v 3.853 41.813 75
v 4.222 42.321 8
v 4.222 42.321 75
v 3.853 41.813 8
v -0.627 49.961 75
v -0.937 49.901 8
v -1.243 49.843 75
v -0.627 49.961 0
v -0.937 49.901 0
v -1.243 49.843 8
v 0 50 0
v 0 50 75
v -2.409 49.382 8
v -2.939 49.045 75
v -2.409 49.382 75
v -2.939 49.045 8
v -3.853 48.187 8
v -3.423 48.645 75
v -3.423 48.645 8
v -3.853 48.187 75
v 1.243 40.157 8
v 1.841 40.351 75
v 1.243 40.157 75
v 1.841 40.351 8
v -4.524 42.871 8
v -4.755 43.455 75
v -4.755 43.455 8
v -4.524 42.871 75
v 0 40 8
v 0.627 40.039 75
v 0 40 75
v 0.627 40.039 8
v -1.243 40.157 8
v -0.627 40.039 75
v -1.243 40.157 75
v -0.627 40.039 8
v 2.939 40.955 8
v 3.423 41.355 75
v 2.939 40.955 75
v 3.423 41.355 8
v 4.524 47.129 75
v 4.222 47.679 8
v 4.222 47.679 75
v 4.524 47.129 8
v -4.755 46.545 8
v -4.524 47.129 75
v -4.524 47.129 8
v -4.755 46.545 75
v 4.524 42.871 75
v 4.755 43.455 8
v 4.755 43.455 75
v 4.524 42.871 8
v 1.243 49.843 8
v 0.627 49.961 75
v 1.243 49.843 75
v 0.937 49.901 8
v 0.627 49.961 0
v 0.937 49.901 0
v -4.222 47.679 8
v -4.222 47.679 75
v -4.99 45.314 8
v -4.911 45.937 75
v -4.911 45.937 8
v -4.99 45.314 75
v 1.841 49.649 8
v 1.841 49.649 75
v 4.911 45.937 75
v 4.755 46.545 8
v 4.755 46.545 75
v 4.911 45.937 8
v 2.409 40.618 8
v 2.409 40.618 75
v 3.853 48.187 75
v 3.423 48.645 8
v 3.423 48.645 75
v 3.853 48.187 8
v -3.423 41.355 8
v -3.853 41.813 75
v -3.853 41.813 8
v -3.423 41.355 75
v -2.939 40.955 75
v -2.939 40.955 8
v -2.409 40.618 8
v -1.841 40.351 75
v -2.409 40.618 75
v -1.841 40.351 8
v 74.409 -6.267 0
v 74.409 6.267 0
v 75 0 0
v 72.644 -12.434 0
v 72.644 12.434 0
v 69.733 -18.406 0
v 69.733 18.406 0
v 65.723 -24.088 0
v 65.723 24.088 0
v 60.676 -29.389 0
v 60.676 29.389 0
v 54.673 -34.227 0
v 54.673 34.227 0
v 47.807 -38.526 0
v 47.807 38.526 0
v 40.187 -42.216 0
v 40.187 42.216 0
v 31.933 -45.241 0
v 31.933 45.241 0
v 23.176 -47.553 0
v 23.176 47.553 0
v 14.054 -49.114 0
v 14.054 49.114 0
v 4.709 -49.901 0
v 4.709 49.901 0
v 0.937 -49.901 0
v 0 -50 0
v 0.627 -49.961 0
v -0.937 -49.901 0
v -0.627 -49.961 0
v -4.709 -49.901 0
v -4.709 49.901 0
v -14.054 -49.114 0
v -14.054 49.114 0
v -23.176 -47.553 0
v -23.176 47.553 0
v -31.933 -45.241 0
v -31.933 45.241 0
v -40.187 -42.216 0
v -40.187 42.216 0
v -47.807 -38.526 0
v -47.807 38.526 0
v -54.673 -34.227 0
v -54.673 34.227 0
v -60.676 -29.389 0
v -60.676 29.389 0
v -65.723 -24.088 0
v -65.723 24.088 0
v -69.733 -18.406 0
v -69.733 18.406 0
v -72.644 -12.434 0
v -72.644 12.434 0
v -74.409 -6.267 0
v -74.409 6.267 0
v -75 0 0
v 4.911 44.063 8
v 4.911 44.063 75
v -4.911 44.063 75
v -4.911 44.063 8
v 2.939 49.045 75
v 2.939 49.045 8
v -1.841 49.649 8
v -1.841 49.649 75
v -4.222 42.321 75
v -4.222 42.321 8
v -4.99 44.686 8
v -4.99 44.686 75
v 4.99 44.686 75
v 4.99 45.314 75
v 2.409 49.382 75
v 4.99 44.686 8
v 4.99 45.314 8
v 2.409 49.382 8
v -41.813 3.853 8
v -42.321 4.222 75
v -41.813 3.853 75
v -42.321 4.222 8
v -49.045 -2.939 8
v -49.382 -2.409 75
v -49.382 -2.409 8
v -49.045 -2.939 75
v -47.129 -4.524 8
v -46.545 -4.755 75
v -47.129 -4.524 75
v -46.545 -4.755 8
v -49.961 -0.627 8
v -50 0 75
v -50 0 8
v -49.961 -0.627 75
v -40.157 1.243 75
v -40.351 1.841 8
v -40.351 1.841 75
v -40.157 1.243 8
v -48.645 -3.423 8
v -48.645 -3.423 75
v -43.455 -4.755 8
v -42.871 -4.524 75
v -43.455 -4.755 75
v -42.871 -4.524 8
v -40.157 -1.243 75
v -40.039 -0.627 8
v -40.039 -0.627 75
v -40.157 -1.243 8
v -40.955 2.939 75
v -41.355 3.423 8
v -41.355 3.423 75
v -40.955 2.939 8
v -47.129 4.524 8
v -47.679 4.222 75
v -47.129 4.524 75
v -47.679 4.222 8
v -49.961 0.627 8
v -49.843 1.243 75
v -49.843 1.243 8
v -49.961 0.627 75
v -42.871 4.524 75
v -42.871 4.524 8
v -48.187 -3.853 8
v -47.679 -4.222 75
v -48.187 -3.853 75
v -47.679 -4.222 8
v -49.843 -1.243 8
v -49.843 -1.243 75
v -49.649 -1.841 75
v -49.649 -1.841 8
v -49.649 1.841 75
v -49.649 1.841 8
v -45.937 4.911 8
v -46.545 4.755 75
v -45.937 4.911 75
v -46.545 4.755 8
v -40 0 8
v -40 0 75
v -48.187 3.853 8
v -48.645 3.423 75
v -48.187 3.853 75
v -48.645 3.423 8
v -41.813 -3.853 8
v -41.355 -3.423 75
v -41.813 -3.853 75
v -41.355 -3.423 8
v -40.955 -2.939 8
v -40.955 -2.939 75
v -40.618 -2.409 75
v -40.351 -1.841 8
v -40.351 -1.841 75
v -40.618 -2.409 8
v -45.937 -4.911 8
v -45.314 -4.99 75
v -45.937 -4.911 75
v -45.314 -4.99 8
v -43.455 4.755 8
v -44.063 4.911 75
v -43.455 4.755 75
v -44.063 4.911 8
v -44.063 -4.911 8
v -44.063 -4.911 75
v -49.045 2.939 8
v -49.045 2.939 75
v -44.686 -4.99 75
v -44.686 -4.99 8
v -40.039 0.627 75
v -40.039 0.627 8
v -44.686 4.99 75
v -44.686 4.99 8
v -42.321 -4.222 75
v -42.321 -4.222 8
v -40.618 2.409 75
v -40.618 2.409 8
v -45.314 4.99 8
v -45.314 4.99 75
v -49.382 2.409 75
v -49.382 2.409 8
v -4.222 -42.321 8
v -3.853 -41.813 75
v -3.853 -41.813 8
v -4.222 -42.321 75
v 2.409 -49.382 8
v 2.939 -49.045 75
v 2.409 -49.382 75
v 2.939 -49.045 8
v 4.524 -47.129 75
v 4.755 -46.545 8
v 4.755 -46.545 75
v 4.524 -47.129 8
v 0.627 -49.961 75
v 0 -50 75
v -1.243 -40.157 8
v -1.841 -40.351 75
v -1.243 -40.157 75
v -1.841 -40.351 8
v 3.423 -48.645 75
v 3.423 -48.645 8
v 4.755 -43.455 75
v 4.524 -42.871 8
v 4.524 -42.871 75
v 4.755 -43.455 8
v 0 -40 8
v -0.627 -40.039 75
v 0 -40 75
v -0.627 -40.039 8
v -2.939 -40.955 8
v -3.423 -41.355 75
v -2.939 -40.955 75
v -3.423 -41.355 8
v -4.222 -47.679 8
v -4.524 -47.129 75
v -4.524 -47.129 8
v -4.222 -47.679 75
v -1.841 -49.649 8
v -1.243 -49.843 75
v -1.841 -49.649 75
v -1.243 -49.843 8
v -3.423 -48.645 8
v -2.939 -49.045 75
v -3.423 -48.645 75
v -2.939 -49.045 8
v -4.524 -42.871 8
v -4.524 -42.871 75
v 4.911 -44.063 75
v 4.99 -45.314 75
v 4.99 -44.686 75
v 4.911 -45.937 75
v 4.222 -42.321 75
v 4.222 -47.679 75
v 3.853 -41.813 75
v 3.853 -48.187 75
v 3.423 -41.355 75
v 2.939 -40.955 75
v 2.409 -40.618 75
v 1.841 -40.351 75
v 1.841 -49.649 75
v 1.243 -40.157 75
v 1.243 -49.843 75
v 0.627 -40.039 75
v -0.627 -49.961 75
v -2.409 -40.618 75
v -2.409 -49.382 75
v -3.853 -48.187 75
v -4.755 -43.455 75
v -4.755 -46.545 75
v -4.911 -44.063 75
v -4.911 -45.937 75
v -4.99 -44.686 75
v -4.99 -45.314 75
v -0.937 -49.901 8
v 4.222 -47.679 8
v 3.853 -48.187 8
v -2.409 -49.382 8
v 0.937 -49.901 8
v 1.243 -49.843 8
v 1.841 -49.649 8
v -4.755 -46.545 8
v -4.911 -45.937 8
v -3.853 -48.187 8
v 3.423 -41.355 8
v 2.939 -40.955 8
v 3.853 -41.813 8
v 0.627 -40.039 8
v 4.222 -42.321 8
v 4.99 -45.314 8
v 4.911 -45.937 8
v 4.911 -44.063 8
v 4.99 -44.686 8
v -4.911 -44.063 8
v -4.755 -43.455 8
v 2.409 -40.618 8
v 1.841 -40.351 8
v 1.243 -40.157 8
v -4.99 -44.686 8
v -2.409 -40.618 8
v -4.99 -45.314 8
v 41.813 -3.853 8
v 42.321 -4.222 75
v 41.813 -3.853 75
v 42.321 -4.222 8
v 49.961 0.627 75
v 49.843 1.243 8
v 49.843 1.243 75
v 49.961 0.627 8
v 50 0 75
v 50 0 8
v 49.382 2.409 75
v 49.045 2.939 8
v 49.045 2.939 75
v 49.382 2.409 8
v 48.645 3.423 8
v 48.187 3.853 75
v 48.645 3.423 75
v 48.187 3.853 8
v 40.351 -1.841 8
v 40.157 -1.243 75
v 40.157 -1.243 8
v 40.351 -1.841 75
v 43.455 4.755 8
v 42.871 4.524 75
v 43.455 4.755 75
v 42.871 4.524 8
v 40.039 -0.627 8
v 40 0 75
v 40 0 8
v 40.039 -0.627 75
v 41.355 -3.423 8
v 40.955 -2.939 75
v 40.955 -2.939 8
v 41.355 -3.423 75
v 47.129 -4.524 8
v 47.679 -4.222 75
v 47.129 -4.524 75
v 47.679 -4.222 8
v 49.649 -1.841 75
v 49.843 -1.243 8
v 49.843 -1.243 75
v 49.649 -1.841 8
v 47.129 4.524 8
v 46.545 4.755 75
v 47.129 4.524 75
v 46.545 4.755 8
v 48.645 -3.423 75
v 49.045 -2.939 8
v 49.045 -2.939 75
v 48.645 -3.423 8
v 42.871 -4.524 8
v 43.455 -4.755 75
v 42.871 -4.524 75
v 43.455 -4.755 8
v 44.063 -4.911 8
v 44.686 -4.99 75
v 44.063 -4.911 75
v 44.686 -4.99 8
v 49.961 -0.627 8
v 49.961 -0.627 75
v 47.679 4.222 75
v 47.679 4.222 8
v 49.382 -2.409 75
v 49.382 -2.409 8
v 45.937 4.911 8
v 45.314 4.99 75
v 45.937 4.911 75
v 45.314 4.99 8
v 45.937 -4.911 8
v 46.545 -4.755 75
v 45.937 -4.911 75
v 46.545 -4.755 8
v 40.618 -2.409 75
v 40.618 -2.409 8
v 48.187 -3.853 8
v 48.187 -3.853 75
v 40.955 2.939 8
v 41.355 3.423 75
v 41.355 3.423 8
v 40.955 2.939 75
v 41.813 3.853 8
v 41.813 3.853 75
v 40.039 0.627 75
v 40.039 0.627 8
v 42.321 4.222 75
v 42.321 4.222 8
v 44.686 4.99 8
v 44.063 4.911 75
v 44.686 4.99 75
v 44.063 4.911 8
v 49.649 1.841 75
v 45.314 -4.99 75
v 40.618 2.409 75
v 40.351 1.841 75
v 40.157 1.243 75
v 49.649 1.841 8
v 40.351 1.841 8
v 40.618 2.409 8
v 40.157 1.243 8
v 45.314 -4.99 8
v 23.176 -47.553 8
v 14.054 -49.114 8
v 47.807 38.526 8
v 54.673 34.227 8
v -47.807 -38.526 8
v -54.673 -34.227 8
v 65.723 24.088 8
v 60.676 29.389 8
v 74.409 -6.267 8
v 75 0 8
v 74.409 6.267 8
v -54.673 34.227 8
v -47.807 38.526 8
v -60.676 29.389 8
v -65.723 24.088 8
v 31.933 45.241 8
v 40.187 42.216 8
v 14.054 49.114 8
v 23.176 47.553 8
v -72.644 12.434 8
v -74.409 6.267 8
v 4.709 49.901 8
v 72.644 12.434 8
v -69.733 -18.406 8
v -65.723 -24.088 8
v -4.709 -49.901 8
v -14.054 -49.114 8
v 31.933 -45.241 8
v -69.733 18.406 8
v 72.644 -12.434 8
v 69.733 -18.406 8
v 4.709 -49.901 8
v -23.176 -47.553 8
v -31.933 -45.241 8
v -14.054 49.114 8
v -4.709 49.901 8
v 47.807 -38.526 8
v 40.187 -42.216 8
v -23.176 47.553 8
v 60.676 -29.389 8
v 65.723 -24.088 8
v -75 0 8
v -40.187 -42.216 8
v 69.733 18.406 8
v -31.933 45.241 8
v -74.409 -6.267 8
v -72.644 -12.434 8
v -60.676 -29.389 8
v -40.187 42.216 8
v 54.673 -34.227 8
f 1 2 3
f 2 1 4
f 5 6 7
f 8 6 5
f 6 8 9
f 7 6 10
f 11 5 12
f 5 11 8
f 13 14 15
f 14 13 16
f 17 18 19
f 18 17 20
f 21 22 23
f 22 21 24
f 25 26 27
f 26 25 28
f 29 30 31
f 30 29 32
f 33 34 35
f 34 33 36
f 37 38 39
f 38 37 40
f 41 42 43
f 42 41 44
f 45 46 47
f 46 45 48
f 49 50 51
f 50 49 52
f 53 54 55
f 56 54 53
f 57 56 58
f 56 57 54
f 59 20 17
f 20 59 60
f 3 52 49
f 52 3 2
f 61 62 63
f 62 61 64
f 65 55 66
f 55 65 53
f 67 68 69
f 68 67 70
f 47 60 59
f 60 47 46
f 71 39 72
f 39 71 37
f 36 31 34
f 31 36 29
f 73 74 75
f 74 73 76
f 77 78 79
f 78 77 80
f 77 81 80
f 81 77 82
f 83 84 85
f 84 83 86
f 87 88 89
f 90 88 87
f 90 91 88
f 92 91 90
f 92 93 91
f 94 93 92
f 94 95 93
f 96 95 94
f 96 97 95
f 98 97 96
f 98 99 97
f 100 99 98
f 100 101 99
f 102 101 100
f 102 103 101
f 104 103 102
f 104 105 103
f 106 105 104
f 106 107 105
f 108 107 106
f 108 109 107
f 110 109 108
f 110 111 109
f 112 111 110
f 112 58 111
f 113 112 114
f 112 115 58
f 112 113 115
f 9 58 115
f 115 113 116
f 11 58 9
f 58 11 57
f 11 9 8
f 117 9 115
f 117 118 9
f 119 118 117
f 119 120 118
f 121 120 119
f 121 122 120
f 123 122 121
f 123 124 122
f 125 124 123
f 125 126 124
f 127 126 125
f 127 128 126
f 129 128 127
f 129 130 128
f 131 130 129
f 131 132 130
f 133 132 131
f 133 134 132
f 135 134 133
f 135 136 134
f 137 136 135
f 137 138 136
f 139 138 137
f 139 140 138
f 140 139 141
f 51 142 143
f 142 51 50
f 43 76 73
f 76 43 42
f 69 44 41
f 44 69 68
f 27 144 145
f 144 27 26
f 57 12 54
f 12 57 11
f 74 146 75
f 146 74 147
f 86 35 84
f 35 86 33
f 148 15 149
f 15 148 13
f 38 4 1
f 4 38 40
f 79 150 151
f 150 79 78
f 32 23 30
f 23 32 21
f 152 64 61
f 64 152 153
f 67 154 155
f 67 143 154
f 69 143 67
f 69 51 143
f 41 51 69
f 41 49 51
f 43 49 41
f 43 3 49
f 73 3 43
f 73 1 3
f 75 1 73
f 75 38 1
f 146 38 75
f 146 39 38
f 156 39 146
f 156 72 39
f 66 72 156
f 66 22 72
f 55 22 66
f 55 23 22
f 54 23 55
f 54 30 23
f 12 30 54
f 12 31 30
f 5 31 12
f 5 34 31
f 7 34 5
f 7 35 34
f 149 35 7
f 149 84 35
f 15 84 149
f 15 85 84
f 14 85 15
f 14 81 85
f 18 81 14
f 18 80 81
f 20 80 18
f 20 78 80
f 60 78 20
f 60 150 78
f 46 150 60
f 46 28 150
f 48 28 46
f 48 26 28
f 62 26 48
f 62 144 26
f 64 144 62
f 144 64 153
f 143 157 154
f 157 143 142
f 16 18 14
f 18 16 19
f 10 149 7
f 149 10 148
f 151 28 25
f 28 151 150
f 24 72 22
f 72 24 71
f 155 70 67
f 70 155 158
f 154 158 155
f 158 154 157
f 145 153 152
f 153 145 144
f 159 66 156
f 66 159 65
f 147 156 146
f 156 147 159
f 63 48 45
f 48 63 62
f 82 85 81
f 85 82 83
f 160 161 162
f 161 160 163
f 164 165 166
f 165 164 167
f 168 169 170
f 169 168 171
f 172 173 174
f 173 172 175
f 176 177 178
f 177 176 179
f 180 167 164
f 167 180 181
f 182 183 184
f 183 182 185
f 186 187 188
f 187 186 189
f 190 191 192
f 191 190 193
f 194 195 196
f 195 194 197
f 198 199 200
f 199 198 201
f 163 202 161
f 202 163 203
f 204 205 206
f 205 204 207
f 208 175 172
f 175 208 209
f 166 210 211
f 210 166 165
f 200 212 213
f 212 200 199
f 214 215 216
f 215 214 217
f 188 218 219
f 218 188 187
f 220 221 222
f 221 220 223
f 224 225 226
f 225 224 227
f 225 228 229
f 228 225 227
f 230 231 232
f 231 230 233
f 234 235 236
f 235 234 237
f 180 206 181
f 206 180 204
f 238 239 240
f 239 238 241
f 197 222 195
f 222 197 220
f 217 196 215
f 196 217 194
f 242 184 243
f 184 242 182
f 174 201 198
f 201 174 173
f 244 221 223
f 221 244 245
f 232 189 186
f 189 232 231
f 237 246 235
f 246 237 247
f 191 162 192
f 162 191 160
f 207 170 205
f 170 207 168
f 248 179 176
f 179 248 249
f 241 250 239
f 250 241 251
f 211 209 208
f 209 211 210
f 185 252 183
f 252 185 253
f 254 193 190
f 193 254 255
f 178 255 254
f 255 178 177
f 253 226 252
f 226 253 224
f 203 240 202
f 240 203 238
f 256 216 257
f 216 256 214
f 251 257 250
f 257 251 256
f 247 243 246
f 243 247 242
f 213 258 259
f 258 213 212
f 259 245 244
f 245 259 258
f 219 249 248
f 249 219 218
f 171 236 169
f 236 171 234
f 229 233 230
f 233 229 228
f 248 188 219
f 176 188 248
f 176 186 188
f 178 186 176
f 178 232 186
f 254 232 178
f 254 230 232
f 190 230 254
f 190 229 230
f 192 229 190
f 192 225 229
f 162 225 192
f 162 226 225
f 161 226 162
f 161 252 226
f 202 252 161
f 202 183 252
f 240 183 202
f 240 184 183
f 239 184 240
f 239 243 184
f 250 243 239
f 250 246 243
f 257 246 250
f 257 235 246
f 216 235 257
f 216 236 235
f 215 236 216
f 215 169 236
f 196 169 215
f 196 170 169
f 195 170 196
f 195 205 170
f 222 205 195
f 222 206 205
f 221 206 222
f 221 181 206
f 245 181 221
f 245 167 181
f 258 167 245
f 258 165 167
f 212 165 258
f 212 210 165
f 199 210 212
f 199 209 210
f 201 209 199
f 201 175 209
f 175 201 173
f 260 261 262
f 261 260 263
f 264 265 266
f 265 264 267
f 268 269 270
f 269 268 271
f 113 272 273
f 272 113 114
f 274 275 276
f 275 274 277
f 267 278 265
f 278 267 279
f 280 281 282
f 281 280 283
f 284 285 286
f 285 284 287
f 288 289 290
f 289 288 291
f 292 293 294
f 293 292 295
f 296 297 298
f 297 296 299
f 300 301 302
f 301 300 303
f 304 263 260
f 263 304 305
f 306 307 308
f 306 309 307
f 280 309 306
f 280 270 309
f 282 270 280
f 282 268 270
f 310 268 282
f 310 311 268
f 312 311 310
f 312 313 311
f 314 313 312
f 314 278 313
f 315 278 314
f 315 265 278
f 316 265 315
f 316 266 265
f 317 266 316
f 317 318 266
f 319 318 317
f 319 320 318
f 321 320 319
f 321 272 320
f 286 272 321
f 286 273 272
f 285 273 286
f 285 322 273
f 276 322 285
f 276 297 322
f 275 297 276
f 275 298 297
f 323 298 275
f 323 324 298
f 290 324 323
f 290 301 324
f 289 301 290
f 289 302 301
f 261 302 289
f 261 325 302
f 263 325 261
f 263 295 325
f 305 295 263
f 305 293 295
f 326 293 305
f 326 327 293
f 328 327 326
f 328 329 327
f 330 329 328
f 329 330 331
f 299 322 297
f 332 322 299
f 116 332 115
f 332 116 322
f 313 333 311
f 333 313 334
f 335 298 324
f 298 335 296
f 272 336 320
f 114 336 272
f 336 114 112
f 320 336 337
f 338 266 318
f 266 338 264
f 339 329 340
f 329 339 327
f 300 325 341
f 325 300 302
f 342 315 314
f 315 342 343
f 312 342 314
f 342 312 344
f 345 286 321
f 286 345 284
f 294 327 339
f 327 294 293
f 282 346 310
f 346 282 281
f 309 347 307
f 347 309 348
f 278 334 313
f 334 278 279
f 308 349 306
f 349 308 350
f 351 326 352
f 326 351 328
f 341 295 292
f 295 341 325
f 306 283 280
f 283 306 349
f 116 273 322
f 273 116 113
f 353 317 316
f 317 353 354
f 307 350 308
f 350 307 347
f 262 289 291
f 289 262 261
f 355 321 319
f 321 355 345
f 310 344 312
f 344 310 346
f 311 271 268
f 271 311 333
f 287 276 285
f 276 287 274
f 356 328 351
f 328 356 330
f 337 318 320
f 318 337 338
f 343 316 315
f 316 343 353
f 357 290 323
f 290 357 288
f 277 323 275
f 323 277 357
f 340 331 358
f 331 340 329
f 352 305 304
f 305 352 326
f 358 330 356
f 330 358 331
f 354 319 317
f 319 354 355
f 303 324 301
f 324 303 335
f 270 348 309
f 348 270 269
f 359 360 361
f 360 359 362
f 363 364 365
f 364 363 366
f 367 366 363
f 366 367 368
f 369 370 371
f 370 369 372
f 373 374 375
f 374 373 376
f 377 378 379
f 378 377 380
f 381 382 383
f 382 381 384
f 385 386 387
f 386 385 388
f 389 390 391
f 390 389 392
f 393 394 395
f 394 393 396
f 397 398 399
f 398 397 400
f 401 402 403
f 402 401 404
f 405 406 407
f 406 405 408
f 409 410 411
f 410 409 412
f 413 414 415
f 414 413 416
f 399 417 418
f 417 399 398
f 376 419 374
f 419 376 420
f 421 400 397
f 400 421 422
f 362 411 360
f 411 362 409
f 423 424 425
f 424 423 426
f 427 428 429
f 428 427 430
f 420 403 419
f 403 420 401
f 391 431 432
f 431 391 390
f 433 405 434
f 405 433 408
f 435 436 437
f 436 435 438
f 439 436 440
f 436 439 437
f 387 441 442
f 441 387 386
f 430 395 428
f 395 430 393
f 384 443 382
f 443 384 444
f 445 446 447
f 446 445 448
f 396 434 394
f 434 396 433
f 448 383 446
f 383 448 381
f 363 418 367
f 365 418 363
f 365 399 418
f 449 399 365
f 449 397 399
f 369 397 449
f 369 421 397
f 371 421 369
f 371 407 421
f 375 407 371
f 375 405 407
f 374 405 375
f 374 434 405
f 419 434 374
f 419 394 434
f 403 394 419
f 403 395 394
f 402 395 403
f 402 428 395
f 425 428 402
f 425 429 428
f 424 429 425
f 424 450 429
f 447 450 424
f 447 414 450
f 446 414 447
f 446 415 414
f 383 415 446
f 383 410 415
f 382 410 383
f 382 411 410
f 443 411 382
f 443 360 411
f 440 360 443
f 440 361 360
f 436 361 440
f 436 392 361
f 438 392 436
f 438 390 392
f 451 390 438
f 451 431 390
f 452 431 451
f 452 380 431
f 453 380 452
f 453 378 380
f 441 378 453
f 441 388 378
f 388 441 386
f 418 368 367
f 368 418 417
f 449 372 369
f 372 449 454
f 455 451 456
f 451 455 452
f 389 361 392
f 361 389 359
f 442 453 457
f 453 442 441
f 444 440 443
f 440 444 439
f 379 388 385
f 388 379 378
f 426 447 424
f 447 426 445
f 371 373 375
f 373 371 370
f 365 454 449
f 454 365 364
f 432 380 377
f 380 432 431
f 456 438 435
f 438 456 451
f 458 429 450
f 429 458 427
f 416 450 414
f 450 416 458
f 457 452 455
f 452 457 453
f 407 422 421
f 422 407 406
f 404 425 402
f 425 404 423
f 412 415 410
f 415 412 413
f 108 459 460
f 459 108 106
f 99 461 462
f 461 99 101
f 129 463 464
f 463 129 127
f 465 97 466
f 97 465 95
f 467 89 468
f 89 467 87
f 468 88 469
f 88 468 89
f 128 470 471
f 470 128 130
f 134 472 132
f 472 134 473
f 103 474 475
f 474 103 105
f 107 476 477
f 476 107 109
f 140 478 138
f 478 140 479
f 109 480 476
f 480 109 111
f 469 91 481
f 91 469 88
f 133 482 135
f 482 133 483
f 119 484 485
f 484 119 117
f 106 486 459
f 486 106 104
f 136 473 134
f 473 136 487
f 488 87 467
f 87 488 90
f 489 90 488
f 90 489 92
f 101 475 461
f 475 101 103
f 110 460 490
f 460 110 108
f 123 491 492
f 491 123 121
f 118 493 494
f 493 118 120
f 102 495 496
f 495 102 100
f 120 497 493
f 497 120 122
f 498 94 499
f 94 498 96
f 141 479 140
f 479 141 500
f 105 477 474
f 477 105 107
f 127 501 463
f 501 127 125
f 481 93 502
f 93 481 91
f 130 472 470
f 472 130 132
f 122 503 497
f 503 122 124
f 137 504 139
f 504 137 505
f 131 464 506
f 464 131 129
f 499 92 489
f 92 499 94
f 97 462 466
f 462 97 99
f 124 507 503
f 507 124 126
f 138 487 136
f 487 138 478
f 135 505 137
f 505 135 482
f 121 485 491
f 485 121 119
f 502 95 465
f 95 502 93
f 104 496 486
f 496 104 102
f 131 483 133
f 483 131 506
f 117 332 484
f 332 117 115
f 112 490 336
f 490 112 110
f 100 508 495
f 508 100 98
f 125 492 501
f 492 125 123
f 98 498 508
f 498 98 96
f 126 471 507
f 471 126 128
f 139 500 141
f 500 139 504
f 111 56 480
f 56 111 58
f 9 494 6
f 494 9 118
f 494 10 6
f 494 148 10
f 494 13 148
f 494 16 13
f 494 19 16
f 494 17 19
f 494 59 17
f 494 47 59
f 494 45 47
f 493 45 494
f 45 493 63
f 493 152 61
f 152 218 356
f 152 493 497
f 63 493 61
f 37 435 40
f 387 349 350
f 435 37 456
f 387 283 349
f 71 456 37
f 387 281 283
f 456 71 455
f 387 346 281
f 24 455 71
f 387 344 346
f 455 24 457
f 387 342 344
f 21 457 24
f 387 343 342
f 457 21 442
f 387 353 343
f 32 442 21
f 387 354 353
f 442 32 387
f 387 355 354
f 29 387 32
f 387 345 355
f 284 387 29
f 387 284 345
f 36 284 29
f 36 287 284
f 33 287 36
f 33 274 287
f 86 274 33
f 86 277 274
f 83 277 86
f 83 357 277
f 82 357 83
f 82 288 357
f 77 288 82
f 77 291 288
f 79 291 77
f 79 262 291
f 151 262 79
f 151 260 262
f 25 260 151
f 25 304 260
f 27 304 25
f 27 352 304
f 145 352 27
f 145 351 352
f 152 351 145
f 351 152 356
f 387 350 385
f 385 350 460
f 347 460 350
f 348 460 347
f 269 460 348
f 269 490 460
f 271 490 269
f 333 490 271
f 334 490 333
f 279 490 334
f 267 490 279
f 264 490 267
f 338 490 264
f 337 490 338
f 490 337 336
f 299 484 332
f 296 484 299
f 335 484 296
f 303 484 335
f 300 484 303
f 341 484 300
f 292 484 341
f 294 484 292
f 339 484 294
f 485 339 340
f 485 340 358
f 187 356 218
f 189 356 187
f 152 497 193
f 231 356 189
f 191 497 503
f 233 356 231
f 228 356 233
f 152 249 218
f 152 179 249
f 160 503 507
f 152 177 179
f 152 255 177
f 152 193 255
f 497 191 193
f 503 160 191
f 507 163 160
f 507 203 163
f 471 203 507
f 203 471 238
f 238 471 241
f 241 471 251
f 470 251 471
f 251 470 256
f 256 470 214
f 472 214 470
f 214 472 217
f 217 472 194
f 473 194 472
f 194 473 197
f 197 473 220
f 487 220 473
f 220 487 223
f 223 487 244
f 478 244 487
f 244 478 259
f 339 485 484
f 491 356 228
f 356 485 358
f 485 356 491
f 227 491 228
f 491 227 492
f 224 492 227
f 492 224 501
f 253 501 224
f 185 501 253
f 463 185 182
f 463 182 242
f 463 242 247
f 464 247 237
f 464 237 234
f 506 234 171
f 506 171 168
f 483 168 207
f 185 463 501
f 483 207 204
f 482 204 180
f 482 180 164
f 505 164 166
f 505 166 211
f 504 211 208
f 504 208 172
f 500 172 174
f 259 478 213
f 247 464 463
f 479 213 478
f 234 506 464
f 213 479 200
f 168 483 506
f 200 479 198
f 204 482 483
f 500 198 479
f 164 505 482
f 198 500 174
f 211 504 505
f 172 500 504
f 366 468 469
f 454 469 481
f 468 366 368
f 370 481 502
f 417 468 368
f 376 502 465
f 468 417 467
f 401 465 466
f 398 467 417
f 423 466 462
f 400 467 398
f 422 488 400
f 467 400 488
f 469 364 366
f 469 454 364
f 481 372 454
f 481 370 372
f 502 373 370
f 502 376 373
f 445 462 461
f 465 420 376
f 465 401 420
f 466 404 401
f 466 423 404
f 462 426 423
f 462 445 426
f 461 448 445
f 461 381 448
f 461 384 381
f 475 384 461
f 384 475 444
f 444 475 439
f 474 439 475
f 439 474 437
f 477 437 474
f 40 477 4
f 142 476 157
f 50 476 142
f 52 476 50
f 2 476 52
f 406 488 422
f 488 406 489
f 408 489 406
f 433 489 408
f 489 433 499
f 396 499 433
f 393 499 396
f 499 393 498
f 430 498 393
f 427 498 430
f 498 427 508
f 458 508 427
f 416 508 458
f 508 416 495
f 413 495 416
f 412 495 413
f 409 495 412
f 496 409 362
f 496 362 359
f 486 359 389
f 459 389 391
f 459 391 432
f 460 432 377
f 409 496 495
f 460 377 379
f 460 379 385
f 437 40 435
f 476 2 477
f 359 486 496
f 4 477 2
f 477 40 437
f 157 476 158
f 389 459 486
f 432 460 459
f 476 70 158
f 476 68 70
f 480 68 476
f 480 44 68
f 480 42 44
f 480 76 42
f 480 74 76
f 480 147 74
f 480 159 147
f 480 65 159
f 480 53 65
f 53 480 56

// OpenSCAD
// A little hat to place over the filter mesh in the depowdering
// cabinet so that the vibrations from the vibrator can reach
// the mesh.

$fn = 50;

scale([1.5, 1, 1])
cylinder(d = 100, h = 8);

for (i = [1 : 4])
{
  rotate([0, 0, i * 360 / 4])
  translate([45, 0, 0])
  cylinder(d = 10, h = 75);
}
